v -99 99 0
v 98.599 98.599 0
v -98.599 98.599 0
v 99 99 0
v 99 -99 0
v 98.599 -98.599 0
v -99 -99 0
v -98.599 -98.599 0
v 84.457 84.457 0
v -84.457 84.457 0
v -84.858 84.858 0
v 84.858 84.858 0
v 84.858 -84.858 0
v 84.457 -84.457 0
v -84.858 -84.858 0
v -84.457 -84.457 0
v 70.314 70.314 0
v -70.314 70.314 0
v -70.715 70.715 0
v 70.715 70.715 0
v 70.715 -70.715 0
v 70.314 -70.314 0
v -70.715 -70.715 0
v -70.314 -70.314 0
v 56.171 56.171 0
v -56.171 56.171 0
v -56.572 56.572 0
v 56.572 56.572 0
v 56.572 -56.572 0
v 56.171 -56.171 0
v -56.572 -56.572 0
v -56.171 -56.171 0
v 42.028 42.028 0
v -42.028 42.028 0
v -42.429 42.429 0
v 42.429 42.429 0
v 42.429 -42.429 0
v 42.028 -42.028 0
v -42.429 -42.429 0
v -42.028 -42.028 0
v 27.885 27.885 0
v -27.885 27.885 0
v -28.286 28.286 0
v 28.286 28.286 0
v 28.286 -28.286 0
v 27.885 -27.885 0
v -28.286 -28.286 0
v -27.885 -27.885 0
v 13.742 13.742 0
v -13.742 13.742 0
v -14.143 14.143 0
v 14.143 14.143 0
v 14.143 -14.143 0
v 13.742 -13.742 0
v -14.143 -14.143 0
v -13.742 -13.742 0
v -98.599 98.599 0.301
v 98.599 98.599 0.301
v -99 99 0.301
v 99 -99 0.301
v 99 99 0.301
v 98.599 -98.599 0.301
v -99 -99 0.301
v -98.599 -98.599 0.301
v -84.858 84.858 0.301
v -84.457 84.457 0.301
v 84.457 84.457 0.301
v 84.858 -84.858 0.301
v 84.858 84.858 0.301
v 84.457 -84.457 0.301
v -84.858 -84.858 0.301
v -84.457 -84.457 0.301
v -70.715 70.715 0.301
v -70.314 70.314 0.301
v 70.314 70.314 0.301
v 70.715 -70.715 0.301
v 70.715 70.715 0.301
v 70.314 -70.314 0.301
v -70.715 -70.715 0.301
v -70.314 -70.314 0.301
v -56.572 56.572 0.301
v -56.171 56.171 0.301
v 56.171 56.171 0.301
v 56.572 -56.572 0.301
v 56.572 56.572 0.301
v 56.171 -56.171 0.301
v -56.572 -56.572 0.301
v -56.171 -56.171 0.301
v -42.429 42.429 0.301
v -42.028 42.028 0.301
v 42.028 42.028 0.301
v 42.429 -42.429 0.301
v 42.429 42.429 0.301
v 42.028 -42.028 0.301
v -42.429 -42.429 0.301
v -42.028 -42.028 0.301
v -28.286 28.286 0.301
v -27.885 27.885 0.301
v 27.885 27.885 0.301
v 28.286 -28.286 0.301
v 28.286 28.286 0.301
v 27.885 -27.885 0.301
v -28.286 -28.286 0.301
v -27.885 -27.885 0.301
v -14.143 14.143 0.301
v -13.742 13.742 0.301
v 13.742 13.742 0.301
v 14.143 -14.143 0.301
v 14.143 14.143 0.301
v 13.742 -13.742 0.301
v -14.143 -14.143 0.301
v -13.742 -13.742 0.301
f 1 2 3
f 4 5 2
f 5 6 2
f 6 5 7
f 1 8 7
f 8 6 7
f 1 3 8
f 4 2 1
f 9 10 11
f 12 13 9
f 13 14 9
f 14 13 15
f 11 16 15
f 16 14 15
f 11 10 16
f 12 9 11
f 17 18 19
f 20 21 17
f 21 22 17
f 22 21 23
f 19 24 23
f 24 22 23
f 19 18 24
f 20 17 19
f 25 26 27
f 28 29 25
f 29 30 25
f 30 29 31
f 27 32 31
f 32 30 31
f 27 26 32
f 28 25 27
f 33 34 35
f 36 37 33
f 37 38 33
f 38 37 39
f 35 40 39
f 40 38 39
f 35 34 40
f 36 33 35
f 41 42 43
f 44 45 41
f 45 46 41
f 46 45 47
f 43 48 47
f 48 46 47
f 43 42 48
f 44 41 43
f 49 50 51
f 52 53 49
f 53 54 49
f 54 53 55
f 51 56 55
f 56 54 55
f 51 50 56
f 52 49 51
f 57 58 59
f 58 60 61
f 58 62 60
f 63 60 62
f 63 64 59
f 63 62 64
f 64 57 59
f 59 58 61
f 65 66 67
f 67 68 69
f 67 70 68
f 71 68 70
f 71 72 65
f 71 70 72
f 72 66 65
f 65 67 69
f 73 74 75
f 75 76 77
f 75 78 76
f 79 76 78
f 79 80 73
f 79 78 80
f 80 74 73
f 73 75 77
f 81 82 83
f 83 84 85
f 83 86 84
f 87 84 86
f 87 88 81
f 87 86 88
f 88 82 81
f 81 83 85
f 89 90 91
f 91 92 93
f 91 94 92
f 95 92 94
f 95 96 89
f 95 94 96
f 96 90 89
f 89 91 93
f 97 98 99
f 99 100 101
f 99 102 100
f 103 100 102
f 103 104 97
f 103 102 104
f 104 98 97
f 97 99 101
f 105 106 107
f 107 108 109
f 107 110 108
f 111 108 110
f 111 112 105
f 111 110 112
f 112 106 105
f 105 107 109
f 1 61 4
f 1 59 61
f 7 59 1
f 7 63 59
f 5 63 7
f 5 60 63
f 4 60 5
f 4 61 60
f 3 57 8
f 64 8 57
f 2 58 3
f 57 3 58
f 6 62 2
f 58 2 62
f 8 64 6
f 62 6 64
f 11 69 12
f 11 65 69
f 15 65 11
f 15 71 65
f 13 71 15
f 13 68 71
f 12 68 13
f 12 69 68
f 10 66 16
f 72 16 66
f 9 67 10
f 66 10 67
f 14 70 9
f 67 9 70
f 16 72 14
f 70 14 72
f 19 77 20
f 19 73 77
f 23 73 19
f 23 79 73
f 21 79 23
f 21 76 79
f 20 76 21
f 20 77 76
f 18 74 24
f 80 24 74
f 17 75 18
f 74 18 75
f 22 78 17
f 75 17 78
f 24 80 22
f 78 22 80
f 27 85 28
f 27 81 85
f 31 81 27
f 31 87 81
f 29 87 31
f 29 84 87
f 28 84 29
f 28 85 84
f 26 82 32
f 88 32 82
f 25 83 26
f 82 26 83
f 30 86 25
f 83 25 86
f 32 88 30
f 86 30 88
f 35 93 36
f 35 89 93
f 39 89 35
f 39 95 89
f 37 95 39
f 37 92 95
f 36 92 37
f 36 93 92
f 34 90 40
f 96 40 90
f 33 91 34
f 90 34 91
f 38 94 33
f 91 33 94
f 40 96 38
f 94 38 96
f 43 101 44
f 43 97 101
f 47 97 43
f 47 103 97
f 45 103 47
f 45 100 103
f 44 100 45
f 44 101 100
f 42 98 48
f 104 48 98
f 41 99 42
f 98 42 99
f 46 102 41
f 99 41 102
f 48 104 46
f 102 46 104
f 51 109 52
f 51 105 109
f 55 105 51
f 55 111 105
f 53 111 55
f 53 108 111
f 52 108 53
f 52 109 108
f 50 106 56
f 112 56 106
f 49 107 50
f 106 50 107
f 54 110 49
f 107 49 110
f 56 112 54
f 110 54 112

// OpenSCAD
// Concentric squares bed level pattern
// Seven nested square outlines across 90% of a 220 x 220 mm bed.

include <../../src/bedlevelpattern.scad>;

// Parameters
bed_level_pattern_type = "concentric squares";
print_area_width = 220.001;
print_area_depth = 220.001;
line_width = 0.401;
line_height = 0.301;
fill_percentage = 90; // Range: [50:100]
concentric_ring_count = 7;
quality_value = 128;

$fn = quality_value;

// Generate the pattern
generate_bed_level_pattern(
  bed_level_pattern_type, print_area_width, print_area_depth, line_width, line_height,
  fill_percentage, concentric_ring_count=concentric_ring_count
);
